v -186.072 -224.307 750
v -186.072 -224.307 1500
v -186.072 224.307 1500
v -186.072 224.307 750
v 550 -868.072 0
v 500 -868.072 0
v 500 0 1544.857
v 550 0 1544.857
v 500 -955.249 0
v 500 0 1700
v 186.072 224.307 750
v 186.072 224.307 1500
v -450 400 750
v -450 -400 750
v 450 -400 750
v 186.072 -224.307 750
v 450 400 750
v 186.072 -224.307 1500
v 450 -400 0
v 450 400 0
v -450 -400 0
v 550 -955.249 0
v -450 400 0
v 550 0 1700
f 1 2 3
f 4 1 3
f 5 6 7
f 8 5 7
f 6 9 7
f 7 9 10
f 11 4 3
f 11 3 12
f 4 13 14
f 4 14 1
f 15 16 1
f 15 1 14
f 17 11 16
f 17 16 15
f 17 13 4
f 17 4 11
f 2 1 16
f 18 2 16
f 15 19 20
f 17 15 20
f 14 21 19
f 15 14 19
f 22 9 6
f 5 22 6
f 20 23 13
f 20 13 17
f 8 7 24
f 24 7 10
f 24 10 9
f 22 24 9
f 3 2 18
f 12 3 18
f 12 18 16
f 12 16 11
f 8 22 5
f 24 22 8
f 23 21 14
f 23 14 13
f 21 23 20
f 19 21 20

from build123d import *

# Parameters (mm, degrees)
F0_W     = 900
F0_H     = 800
F1_DEPTH = 750
F2_W     = 372.144908
F2_H     = 448.613166
F3_DEPTH = 750
F6_DEPTH = 50


with BuildPart() as f1:
    # F0 (on Top) → F1 (new body)
    with BuildSketch(Plane.XY):
        Rectangle(F0_W, F0_H)
    extrude(amount=F1_DEPTH)

    # F2 (on face) → F3 (join)
    with BuildSketch(Plane.XY.offset(750)):
        Rectangle(F2_W, F2_H)
    extrude(amount=F3_DEPTH)


with BuildPart() as f6:
    # F5 (on offset) → F6 (new body)
    with BuildSketch(Plane.YZ.offset(500)):
        Polygon((0, 1700), (-955.248659, 0), (-868.072188, 0), (0, 1544.857149), align=None)
    extrude(amount=F6_DEPTH)


solid = Compound([f1.part, f6.part])
